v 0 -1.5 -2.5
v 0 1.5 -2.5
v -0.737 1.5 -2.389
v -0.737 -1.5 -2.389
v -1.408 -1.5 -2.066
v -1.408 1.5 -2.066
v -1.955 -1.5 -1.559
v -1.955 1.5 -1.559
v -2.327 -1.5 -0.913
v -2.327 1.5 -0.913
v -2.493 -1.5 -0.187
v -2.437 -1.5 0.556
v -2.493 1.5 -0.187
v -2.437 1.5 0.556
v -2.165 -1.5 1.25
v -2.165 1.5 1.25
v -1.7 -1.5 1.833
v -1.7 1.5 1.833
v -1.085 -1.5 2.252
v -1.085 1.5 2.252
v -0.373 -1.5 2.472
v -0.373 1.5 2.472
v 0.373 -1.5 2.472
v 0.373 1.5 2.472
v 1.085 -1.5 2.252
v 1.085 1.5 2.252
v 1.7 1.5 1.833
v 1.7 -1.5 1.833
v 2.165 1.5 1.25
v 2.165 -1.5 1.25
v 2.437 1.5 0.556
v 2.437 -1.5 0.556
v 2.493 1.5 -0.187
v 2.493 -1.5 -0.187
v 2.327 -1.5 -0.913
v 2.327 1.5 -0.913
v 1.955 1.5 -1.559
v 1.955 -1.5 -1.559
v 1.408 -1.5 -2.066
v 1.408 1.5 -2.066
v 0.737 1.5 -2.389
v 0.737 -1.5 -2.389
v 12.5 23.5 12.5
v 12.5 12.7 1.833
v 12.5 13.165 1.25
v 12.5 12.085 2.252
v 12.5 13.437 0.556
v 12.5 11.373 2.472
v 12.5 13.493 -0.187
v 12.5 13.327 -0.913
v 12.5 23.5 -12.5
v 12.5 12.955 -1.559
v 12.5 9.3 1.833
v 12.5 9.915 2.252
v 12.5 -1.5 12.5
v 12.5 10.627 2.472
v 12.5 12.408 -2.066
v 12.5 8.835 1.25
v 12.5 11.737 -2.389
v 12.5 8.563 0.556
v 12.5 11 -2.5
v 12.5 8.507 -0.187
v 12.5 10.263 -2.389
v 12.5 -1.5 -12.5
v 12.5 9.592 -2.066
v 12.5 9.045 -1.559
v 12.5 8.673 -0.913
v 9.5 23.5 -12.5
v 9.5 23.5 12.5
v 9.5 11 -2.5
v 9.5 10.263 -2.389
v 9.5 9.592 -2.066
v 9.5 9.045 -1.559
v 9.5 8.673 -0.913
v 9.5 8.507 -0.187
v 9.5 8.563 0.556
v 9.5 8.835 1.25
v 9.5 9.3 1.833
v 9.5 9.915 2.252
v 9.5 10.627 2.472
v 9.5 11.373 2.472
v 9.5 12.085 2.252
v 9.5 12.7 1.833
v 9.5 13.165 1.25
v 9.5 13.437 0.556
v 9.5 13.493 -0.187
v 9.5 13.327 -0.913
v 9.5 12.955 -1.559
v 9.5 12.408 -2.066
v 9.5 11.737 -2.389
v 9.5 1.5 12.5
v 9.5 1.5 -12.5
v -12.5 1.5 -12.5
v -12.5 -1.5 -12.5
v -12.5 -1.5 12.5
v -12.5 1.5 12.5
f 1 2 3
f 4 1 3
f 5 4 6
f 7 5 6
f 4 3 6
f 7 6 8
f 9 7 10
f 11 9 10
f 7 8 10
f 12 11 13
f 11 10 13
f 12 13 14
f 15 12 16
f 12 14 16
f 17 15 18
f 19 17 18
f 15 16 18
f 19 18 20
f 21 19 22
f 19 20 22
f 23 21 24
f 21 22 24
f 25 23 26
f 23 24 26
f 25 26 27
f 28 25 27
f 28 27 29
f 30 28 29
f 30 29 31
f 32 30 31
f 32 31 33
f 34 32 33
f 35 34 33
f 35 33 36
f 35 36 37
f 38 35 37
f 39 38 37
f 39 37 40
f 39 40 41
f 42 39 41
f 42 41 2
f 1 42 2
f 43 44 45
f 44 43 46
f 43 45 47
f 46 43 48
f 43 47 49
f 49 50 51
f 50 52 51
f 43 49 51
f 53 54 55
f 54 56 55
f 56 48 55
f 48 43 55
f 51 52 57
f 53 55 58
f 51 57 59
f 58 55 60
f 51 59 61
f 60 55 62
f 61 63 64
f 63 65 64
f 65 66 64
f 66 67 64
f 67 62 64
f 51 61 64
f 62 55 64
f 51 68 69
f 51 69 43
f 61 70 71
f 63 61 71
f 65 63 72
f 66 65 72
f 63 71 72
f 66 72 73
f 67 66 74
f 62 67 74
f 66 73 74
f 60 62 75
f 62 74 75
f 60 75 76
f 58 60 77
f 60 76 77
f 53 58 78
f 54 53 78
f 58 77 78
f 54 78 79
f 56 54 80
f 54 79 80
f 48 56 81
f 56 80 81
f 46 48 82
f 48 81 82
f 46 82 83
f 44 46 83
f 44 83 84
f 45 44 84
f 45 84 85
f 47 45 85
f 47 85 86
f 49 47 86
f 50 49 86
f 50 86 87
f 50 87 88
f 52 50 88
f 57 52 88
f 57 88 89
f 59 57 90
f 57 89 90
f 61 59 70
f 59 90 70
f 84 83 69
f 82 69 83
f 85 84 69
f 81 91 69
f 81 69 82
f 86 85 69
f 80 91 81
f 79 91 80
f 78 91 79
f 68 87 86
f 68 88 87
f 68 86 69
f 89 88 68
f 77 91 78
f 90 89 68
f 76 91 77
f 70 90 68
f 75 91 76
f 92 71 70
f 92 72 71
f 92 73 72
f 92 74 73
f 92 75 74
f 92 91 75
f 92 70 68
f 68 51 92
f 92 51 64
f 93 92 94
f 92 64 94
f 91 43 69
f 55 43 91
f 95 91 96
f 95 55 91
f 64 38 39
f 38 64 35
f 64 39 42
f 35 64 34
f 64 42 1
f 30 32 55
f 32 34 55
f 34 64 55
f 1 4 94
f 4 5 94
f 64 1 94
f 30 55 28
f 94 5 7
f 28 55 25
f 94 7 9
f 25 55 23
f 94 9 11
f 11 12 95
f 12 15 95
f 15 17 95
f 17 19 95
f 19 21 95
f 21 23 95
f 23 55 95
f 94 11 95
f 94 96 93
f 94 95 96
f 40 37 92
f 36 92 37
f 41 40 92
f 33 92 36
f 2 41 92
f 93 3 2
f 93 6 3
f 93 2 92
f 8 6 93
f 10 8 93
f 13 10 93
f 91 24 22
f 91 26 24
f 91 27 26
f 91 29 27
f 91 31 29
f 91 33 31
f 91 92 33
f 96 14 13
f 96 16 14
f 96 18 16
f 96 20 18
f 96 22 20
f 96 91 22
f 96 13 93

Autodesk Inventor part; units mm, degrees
ref_plane "YZ Plane" through (0, 0, 0) normal (1, 0, 0) x (0, 1, 0)
ref_plane "XZ Plane" through (0, 0, 0) normal (0, 1, 0) x (-1, 0, 0)
ref_plane "XY Plane" through (0, 0, 0) normal (0, 0, 1) x (1, 0, 0)
sketch "Sketch1" plane through (0, 0, 0) normal (0, 1, 0) x (-1, 0, 0)
  line L0 (-12.5, 12.5) -> (12.5, 12.5)
  line L1 (12.5, 12.5) -> (12.5, -12.5)
  line L2 (12.5, -12.5) -> (-12.5, -12.5)
  line L3 (-12.5, -12.5) -> (-12.5, 12.5)
  line L4 (-12.5, 12.5) -> (12.5, -12.5) construction
  line L5 (12.5, 12.5) -> (-12.5, -12.5) construction
  point P0 (0, 0)
  dimension "d0" = 25
  dimension "d1" = 25
extrude "Extrusion1" add sketch "Sketch1" along normal mid plane 3
sketch "Sketch2" plane through (0, 1.5, 0) normal (0, 1, 0) x (1, 0, 0)
  line L0 (12.5, -12.5) -> (12.5, 12.5) projected
  line L1 (12.5, 12.5) -> (-12.5, 12.5) projected
  line L2 (12.5, -12.5) -> (9.5, -12.5)
  line L3 (9.5, -12.5) -> (9.5, 12.5)
  line L4 (9.5, 12.5) -> (12.5, 12.5)
  line L5 (12.5, 12.5) -> (12.5, -12.5)
  point P0 (0, 0)
  dimension "d4" = 3
extrude "Extrusion2" add sketch "Sketch2" along normal blind 22
sketch "Sketch3" plane through (12.5, -1.5, 12.5) normal (1, 0, 0) x (0, 0, -1)
  line L0 (25, 0) -> (25, 25) projected
  line L1 (25, 0) -> (0, 0) projected
  point P0 (12.5, 1.5)
  point P1 (12.5, 12.5)
  point P2 (25, 12.5)
  point P3 (12.5, 0)
hole "Hole1" at (12.5, 11, 0) direction (-1, 0, 0) diameter 5 end through all
sketch "Sketch4" plane through (0, -1.5, 0) normal (0, -1, 0) x (1, 0, 0)
  point P0 (0, 0)
  point P1 (0, 0)
hole "Hole2" at (0, -1.5, 0) direction (0, 1, 0) diameter 5 end through all
properties part number "WCDLBRACKET"
